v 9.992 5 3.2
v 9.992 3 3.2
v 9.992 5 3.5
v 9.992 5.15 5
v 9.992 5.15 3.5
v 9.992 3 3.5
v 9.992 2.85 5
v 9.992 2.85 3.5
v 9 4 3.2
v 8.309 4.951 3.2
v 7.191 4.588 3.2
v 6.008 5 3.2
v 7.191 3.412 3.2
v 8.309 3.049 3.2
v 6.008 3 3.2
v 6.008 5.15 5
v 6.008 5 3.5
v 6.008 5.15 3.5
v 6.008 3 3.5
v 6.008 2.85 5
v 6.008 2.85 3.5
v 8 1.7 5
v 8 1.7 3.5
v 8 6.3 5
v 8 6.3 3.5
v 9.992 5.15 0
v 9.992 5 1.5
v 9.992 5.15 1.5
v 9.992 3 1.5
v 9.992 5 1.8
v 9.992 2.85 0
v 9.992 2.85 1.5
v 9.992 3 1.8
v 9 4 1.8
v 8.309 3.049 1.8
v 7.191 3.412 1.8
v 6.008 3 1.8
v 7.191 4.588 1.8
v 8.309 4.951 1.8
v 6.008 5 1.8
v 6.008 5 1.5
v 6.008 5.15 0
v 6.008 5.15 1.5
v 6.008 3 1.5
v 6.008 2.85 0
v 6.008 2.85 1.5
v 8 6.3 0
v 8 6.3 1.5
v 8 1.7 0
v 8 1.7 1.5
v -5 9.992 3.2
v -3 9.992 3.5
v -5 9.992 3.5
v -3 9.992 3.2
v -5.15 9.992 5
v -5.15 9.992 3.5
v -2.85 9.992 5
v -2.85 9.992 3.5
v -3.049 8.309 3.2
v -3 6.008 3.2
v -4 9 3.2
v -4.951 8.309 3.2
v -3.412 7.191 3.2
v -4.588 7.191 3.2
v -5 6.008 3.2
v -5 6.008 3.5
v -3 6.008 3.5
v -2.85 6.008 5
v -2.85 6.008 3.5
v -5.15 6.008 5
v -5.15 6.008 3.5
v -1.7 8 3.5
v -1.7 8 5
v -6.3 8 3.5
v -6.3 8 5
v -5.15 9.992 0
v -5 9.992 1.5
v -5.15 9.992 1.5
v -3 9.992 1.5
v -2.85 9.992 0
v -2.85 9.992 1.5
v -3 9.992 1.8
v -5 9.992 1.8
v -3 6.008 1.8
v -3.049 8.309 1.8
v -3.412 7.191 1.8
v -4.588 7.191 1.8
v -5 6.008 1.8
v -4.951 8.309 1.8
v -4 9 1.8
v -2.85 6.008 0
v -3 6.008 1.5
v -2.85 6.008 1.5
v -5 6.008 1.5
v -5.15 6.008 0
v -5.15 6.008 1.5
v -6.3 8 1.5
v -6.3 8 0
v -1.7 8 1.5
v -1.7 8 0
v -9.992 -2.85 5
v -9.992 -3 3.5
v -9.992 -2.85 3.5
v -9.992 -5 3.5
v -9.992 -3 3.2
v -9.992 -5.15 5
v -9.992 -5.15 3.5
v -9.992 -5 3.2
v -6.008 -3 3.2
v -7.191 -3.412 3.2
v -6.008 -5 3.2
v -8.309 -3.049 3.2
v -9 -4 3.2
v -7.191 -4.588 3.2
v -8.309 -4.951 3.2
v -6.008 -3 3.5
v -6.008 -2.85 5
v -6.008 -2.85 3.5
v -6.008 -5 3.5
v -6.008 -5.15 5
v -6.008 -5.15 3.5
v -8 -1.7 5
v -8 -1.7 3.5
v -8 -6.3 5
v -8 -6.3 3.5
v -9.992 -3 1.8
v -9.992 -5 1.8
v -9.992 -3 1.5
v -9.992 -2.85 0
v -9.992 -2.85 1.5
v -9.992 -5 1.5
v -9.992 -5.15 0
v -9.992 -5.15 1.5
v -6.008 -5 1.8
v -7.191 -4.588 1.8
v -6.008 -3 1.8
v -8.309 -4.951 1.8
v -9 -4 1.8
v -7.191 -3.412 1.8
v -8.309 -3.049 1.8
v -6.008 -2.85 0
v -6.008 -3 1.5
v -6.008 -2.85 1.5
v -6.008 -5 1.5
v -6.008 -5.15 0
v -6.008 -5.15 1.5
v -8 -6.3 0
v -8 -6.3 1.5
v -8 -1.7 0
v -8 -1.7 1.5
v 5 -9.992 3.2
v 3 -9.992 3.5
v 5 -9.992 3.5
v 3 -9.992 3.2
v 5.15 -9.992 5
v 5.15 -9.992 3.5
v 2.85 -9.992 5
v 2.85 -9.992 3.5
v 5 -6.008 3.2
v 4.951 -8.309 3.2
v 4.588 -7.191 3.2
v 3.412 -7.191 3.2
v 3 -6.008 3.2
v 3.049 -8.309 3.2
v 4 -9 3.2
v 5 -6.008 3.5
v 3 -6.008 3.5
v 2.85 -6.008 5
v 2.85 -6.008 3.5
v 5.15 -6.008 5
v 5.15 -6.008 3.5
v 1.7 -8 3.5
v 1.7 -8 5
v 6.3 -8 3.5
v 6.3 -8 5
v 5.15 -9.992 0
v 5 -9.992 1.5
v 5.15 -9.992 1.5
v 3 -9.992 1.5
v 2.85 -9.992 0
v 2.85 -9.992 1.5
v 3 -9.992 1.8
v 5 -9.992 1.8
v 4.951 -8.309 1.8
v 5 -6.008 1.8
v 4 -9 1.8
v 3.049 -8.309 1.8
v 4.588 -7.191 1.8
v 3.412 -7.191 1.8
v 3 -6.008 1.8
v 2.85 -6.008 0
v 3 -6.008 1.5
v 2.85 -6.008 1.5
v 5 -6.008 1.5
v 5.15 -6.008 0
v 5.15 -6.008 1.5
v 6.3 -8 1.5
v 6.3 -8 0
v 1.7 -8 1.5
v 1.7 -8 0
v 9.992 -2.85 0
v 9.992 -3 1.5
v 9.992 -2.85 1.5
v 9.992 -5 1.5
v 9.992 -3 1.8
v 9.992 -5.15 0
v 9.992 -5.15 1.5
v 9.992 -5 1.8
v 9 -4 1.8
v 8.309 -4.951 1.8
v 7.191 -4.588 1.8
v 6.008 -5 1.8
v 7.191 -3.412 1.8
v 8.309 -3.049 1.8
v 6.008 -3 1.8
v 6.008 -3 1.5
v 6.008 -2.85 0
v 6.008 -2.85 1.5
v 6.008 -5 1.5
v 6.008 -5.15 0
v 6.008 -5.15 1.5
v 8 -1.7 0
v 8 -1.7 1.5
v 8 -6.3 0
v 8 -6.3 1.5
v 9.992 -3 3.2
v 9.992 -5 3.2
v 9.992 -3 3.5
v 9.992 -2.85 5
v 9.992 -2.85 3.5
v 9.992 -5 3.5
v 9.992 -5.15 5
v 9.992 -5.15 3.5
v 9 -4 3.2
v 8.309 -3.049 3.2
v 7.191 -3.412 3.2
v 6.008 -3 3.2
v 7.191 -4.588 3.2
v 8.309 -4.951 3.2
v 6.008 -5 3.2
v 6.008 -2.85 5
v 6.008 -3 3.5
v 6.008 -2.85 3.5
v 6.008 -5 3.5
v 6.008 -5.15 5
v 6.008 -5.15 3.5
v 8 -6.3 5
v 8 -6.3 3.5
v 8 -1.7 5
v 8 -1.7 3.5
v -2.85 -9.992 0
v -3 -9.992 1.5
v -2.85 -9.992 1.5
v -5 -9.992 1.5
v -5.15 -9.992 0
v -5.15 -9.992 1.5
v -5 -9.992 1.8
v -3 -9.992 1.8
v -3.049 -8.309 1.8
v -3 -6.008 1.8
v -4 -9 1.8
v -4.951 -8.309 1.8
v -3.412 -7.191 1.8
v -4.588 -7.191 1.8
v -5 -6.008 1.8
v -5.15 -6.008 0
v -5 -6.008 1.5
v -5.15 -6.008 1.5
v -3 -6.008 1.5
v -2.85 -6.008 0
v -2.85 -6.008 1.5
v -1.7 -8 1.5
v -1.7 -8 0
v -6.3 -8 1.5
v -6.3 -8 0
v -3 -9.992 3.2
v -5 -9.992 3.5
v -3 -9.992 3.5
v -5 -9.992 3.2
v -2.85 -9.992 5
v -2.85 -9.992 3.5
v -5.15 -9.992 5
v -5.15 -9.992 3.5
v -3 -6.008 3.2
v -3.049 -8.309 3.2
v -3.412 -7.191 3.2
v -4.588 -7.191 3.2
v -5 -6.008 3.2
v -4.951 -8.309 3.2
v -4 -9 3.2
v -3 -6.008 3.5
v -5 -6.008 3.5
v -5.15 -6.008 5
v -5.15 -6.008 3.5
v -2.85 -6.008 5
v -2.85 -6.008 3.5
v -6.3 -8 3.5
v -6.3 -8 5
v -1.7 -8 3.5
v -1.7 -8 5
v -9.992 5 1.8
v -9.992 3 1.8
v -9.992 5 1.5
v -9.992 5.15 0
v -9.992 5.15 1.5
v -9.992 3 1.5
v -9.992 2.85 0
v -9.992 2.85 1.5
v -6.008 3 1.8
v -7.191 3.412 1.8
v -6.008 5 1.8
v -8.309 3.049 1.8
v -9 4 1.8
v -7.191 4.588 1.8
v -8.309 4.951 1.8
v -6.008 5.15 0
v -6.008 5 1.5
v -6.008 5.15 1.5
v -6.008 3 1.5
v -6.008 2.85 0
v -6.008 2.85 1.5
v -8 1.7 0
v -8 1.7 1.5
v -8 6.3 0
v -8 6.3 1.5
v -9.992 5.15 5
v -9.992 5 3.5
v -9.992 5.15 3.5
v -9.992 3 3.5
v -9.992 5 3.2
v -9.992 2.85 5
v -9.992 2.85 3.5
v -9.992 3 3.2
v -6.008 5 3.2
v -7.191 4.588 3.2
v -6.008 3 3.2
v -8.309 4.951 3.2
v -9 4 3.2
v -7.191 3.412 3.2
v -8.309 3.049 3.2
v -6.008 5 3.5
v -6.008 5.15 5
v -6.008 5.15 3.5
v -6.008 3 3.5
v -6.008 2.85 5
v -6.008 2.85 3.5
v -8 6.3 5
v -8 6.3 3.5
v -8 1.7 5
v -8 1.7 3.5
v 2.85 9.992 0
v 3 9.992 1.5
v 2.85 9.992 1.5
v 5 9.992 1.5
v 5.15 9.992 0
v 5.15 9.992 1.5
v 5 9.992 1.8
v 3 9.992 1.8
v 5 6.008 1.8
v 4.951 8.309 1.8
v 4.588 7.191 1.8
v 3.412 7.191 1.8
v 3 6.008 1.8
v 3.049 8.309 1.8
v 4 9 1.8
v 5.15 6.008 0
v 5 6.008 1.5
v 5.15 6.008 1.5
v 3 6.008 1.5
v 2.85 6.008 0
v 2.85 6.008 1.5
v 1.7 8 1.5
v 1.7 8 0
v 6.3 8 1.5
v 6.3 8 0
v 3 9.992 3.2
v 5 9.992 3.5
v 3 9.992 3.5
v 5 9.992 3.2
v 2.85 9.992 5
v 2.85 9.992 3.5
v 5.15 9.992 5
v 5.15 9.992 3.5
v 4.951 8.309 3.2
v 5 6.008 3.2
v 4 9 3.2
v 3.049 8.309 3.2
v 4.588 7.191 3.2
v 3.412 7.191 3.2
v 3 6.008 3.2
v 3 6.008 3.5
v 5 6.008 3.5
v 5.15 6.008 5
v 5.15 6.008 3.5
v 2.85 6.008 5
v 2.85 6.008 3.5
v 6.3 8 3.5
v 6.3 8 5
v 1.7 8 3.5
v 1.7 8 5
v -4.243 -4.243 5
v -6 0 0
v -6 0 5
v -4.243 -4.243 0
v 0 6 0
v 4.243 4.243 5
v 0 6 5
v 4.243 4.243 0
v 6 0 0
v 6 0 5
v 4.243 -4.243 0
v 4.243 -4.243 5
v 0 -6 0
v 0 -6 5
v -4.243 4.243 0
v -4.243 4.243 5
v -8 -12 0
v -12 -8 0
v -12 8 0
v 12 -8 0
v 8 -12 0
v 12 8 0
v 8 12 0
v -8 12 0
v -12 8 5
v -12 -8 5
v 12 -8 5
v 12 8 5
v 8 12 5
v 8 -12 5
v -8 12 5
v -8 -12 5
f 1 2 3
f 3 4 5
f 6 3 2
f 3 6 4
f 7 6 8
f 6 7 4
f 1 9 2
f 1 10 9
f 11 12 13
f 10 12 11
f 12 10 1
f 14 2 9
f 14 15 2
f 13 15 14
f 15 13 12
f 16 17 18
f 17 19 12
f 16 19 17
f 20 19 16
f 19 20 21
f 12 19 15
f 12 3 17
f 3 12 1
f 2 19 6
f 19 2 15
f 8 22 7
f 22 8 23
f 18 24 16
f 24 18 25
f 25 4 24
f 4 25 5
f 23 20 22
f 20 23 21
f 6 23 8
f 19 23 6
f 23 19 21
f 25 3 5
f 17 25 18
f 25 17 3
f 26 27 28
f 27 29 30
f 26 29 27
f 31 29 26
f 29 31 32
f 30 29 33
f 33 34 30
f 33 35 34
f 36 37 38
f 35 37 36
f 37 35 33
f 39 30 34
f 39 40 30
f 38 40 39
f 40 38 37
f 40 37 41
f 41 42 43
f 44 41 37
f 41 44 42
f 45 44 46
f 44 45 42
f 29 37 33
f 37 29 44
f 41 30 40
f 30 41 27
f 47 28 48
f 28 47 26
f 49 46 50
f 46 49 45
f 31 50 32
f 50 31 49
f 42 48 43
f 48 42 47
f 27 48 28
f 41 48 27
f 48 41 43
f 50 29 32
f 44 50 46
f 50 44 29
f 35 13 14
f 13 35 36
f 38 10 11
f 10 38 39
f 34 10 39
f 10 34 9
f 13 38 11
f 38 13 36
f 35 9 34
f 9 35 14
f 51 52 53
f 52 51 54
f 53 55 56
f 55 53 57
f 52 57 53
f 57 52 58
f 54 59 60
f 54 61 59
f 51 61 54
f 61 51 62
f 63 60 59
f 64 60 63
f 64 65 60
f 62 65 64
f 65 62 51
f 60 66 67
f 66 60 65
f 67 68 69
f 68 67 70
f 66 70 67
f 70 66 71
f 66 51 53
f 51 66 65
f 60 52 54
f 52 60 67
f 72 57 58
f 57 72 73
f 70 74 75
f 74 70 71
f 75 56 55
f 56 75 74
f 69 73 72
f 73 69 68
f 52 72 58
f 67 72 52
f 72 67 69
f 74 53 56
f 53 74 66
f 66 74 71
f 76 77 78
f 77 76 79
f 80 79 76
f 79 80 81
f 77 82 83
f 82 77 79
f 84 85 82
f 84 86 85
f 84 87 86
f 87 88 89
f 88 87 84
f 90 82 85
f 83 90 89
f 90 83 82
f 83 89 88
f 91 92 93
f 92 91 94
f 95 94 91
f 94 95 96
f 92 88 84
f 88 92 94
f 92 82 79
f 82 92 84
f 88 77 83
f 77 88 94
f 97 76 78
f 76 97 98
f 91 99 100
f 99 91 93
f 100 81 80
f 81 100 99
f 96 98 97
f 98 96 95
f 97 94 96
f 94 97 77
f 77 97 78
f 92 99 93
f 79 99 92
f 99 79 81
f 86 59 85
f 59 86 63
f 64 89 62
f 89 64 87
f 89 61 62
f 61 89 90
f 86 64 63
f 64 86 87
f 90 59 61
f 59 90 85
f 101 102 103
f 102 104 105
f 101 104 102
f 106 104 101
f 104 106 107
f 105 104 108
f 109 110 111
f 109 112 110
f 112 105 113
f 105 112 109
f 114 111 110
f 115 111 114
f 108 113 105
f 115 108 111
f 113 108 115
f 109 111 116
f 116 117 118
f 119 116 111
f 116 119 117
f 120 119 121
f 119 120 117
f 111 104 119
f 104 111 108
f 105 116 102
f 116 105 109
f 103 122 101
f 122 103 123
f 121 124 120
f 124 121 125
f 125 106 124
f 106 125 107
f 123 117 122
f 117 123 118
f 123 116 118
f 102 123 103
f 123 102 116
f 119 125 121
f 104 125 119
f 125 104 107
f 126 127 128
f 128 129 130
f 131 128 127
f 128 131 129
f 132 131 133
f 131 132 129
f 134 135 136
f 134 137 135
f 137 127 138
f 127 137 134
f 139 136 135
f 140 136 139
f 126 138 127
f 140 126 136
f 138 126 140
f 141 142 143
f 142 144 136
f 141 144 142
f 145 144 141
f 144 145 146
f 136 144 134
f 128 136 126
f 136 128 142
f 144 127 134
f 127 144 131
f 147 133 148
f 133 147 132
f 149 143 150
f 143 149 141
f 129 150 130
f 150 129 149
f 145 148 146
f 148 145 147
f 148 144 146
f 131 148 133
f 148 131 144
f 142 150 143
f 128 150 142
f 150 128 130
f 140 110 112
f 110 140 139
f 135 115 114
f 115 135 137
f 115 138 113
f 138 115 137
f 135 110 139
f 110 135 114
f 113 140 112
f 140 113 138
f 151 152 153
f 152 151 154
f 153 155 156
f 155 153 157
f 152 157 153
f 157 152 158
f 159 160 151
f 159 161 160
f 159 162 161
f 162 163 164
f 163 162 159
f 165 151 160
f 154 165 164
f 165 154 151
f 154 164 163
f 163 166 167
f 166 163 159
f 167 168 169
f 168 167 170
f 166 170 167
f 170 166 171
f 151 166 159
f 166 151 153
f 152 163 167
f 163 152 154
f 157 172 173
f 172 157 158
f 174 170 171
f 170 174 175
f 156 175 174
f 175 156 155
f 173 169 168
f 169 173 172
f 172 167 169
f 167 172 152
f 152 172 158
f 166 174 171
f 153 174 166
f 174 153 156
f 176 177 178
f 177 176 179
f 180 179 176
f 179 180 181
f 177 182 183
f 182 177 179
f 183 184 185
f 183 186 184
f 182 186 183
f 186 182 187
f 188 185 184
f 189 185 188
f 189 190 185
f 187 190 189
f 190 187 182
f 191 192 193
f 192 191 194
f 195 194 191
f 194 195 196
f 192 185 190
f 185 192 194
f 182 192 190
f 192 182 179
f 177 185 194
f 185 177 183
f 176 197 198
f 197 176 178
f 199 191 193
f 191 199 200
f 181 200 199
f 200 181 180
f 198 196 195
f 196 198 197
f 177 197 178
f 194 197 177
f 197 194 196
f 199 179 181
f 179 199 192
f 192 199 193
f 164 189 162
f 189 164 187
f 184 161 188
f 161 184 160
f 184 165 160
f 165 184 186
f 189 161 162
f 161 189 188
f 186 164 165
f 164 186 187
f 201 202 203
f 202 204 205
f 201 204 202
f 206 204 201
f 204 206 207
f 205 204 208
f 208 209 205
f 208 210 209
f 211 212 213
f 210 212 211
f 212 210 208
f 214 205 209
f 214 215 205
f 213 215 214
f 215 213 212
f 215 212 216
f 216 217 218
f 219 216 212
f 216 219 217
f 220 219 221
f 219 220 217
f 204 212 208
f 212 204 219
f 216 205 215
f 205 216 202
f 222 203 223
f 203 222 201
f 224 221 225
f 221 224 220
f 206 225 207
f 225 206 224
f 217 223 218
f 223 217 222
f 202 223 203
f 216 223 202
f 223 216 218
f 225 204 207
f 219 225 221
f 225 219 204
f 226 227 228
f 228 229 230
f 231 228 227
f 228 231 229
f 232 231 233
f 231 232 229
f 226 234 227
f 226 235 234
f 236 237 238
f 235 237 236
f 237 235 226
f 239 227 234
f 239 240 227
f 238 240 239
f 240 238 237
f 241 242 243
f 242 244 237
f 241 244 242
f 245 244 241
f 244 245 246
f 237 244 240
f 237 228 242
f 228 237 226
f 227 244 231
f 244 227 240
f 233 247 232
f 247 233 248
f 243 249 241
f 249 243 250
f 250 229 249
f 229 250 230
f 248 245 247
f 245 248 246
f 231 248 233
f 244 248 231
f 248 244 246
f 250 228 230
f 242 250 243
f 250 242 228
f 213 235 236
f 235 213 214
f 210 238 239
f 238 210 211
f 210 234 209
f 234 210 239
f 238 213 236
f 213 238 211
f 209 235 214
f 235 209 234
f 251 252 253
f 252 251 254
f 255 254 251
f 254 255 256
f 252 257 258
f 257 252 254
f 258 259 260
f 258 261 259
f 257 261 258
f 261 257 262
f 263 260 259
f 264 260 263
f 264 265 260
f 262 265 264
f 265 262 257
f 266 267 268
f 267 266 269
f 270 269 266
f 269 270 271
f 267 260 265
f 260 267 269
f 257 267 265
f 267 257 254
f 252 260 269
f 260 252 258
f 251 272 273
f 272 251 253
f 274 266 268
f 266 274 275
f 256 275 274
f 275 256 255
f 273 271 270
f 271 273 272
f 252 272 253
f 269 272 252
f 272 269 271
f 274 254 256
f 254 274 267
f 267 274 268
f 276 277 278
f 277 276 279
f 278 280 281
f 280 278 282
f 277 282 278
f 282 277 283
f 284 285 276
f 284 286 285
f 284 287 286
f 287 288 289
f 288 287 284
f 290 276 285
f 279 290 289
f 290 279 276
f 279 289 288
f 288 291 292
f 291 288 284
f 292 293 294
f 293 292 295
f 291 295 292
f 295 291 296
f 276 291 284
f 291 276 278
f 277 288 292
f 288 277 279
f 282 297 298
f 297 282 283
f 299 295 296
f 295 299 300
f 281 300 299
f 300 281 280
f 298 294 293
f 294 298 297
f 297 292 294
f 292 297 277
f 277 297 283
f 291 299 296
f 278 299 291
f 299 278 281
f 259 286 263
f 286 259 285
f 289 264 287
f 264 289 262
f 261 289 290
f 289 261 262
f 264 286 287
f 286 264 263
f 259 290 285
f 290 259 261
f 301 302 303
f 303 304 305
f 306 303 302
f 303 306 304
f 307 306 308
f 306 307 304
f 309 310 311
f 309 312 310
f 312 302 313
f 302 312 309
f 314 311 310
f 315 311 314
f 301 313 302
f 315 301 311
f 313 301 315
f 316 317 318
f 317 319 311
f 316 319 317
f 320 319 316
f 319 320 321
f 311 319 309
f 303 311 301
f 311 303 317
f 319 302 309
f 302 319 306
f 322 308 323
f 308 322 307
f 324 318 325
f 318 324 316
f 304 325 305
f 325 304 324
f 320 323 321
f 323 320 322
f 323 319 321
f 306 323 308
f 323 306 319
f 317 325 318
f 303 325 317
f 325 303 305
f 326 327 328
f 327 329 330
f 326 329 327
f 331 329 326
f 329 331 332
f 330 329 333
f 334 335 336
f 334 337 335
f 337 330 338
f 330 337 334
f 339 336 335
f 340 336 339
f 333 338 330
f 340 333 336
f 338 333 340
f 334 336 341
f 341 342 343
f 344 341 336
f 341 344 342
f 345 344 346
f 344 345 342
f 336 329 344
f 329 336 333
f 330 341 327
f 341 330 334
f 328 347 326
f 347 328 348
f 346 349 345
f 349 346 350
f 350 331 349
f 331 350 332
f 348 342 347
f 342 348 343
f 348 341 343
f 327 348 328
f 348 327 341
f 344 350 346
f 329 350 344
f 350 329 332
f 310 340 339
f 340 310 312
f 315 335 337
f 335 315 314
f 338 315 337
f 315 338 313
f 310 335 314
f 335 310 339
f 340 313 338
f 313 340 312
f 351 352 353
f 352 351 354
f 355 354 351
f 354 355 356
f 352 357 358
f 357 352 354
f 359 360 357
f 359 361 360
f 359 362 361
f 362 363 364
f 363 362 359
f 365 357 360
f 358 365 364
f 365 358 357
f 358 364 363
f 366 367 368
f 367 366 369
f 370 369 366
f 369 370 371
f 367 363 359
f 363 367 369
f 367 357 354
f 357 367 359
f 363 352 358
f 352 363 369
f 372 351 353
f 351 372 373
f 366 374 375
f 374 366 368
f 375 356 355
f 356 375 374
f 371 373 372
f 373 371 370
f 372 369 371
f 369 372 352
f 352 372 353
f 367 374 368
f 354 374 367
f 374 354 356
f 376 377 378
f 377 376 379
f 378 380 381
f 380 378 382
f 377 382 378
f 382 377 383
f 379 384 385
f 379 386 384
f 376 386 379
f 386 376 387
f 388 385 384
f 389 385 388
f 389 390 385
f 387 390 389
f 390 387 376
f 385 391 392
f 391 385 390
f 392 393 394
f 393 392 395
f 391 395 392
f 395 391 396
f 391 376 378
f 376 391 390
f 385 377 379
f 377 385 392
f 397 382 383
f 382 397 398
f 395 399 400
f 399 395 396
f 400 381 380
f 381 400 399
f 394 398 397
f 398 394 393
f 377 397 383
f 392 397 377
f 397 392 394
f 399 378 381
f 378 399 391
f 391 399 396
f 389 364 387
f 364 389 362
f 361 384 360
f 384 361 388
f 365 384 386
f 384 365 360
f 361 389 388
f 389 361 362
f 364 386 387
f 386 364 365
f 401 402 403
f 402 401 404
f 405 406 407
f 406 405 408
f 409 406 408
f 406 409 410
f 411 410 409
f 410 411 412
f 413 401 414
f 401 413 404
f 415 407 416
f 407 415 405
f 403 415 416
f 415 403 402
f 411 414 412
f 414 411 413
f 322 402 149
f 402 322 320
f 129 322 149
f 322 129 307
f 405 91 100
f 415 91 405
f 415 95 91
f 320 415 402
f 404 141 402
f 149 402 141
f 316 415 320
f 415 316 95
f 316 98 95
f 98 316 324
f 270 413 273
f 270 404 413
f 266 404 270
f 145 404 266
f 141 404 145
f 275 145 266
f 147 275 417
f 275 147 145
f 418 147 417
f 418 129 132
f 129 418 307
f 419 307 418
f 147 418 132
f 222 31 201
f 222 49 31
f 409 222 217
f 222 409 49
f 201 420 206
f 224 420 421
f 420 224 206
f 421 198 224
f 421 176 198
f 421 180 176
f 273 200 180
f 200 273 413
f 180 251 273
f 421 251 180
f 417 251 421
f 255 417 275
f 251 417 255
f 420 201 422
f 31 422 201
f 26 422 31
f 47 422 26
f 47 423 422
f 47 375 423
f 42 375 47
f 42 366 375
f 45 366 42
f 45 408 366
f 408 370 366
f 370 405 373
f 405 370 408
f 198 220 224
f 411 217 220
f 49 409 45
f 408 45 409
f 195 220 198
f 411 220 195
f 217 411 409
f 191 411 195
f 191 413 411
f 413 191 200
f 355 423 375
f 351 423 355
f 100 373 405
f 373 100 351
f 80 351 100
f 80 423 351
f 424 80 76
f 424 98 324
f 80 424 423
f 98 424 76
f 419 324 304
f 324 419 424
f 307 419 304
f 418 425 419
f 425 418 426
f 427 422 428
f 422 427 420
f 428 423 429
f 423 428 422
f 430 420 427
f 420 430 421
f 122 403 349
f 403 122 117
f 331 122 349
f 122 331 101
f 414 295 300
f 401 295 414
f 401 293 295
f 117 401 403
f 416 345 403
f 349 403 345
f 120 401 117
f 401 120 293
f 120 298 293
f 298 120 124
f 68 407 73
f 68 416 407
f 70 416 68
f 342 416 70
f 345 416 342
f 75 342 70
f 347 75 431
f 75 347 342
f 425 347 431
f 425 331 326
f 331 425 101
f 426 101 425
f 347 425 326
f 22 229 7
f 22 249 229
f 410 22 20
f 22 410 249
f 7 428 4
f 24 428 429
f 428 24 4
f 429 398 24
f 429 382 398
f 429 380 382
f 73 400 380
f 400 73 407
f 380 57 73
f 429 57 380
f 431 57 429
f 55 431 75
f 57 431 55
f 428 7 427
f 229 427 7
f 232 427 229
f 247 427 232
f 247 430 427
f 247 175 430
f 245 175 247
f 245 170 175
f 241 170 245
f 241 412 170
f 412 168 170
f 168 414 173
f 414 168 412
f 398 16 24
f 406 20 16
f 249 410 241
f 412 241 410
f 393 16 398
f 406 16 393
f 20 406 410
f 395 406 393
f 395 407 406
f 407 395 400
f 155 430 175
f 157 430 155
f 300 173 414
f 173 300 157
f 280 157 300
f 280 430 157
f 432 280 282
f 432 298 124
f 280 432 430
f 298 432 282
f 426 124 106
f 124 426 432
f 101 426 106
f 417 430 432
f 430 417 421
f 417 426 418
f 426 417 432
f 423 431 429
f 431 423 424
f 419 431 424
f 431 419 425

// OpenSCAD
// file: ../tile.scad
//      0   1             2         3  4      5      6
//    [ a,  screw_coord,  corner_r, t, nut_d, nut_h, screw_d]
T36 = [ 36, [ 13, 8, 0 ], 6.000000, 3, 6.000, 2.500, 3 ];
T24 = [ 24, [ 08, 4, 0 ], 4.000000, 2, 4.600, 1.800, 2 ];

function Ta(class) = class[0];
function Tscrew_coord(class) = class[1];
function Tcorner(class) = class[2];
function Tt(class) = class[3];
function Tnut_d(class) = class[4];
function Tnut_h(class) = class[5];
function Tscrew_d(class) = class[6];

module tile(class, h, center = false, centered_hole = false) difference() {
    tile_pos(class = class, h = h, center = center);
    tile_neg(class = class, h = h, center = center,
             centered_hole = centered_hole);
}

module tile_neg(class, h, center = false, centered_hole = false) {
    translate([ 0, 0, center ? 0 : h / 2 ]) for (alpha = [ 0, 180 ])
        rotate([ alpha, 0, 0 ]) tile_screw_pos(class = class) tile_screw_hole(
            class = class, h = h, centered_hole = centered_hole);
    tile_center_hole(class, h + 2, center = center);
}

module tile_pos(class, h, center = false)
    linear_extrude(height = h, center = center, convexity = 10)
        tile_relief(class = class, a = Ta(class), corner_r = Tcorner(class),
                    t = Tt(class), nut_d = Tnut_d(class));

module tile_H(class, h) color("purple") render() difference() {
    top_offset = Ta(class) + h;
    z_center = Ta(class) / 2 + h;
    center_t = Tt(class) + 2 * Tnut_h(class);

    union() {
        translate([ 0, 0, z_center ])
            cube([ Ta(class), center_t, Ta(class) + 2 * h ], center = true);
        for (z = [ 0, top_offset ])
            translate([ 0, 0, z ]) linear_extrude(height = h)
                tile_base_shape(l = Ta(class), corner_r = Tcorner(class));
    }

    translate([ 0, 0, z_center ]) rotate([ 90, 0, 0 ]) {
        tile_neg(class, h = center_t, center = true, centered_hole = true);
        tile_center_hole(class, h = center_t, center = true);
    }

    for (z = [ 0, top_offset ])
        translate([ 0, 0, z ]) tile_center_hole(class, h = h);

    tile_screw_pos(class = class) translate([ 0, 0, h / 2 ])
        tile_screw_hole(class = class, h = h);

    mirror([ 1, 0, 0 ]) tile_screw_pos(class = class)
        translate([ 0, 0, Ta(class) + h + Tt(class) ]) rotate([ 180, 0, 0 ])
            tile_screw_hole(class = class, h = h);
}

module tile_raw_plate(class, x, y, t) {

    for (i = [0:x - 1], j = [0:y - 1])
        translate([ i * Ta(class), j * Ta(class), 0 ]) difference() {
            tile_pos(class, h = t, center = false);
            tile_screw_pos(class = class)
                cylinder(d = Tscrew_d(class), h = 100, center = true);
        }
}

//          Implementation
// ------------------------------------

module tile_center_hole(class, h, center = false) {
    cylinder(d = Ta(class) / 2, h = h, center = center, $fn = 8);
}

module tile_base_shape(l, corner_r) {
    hull() {
        square([ l - corner_r * 2, l ], center = true);
        square([ l, l - corner_r * 2 ], center = true);
    }
}

module tile_relief(class, a, corner_r, t, nut_d) {
    tile_base_shape(a, corner_r);
}

module tile_screw_pos(class) {
    for (alpha = [0:90:360])
        rotate([ 0, 0, alpha ]) translate(Tscrew_coord(class)) children();
}

module tile_plate(class, t) difference() {
    linear_extrude(height = t) tile_base_shape(Ta(class), Tcorner(class));

    mirror([ 1, 0, 0 ]) tile_screw_pos(class)
        cylinder(d = Tscrew_d(class), h = t * 3, center = true);
}

module tile_screw_hole(class, h, centered_hole = false) {
    layer_t = 0.3;
    nut_e = sqrt(pow(Tnut_d(class), 2) - pow(Tnut_d(class) / 2, 2));

    cylinder(d = Tscrew_d(class), h = h + 2, center = true);
    if (centered_hole) {
        for (alpha = [ 0, 180 ])
            rotate([ alpha, 0, 0 ]) translate([ 0, 0, Tt(class) / 2 ]) {
                cube([ nut_e, Tscrew_d(class), layer_t * 2 ], center = true);
                rotate([ 0, 0, 30 ])
                    cylinder(d = Tnut_d(class), h = h, $fn = 6);
            }
    } else {
        translate([ 0, 0, Tt(class) - h / 2 ]) {
            cube([ nut_e, Tscrew_d(class), layer_t * 2 ], center = true);
            rotate([ 0, 0, 30 ]) cylinder(
                d = Tnut_d(class), h = h - Tt(class) + Tnut_h(class), $fn = 6);
        }
    }
}

module tile_tube_hole(d) {
    rotate([ 90, 0, 0 ]) cylinder(d = d, h = 100, center = true);
}
// main file
include <../tile.scad>

tile(T24, h=5, centered_hole=true);
